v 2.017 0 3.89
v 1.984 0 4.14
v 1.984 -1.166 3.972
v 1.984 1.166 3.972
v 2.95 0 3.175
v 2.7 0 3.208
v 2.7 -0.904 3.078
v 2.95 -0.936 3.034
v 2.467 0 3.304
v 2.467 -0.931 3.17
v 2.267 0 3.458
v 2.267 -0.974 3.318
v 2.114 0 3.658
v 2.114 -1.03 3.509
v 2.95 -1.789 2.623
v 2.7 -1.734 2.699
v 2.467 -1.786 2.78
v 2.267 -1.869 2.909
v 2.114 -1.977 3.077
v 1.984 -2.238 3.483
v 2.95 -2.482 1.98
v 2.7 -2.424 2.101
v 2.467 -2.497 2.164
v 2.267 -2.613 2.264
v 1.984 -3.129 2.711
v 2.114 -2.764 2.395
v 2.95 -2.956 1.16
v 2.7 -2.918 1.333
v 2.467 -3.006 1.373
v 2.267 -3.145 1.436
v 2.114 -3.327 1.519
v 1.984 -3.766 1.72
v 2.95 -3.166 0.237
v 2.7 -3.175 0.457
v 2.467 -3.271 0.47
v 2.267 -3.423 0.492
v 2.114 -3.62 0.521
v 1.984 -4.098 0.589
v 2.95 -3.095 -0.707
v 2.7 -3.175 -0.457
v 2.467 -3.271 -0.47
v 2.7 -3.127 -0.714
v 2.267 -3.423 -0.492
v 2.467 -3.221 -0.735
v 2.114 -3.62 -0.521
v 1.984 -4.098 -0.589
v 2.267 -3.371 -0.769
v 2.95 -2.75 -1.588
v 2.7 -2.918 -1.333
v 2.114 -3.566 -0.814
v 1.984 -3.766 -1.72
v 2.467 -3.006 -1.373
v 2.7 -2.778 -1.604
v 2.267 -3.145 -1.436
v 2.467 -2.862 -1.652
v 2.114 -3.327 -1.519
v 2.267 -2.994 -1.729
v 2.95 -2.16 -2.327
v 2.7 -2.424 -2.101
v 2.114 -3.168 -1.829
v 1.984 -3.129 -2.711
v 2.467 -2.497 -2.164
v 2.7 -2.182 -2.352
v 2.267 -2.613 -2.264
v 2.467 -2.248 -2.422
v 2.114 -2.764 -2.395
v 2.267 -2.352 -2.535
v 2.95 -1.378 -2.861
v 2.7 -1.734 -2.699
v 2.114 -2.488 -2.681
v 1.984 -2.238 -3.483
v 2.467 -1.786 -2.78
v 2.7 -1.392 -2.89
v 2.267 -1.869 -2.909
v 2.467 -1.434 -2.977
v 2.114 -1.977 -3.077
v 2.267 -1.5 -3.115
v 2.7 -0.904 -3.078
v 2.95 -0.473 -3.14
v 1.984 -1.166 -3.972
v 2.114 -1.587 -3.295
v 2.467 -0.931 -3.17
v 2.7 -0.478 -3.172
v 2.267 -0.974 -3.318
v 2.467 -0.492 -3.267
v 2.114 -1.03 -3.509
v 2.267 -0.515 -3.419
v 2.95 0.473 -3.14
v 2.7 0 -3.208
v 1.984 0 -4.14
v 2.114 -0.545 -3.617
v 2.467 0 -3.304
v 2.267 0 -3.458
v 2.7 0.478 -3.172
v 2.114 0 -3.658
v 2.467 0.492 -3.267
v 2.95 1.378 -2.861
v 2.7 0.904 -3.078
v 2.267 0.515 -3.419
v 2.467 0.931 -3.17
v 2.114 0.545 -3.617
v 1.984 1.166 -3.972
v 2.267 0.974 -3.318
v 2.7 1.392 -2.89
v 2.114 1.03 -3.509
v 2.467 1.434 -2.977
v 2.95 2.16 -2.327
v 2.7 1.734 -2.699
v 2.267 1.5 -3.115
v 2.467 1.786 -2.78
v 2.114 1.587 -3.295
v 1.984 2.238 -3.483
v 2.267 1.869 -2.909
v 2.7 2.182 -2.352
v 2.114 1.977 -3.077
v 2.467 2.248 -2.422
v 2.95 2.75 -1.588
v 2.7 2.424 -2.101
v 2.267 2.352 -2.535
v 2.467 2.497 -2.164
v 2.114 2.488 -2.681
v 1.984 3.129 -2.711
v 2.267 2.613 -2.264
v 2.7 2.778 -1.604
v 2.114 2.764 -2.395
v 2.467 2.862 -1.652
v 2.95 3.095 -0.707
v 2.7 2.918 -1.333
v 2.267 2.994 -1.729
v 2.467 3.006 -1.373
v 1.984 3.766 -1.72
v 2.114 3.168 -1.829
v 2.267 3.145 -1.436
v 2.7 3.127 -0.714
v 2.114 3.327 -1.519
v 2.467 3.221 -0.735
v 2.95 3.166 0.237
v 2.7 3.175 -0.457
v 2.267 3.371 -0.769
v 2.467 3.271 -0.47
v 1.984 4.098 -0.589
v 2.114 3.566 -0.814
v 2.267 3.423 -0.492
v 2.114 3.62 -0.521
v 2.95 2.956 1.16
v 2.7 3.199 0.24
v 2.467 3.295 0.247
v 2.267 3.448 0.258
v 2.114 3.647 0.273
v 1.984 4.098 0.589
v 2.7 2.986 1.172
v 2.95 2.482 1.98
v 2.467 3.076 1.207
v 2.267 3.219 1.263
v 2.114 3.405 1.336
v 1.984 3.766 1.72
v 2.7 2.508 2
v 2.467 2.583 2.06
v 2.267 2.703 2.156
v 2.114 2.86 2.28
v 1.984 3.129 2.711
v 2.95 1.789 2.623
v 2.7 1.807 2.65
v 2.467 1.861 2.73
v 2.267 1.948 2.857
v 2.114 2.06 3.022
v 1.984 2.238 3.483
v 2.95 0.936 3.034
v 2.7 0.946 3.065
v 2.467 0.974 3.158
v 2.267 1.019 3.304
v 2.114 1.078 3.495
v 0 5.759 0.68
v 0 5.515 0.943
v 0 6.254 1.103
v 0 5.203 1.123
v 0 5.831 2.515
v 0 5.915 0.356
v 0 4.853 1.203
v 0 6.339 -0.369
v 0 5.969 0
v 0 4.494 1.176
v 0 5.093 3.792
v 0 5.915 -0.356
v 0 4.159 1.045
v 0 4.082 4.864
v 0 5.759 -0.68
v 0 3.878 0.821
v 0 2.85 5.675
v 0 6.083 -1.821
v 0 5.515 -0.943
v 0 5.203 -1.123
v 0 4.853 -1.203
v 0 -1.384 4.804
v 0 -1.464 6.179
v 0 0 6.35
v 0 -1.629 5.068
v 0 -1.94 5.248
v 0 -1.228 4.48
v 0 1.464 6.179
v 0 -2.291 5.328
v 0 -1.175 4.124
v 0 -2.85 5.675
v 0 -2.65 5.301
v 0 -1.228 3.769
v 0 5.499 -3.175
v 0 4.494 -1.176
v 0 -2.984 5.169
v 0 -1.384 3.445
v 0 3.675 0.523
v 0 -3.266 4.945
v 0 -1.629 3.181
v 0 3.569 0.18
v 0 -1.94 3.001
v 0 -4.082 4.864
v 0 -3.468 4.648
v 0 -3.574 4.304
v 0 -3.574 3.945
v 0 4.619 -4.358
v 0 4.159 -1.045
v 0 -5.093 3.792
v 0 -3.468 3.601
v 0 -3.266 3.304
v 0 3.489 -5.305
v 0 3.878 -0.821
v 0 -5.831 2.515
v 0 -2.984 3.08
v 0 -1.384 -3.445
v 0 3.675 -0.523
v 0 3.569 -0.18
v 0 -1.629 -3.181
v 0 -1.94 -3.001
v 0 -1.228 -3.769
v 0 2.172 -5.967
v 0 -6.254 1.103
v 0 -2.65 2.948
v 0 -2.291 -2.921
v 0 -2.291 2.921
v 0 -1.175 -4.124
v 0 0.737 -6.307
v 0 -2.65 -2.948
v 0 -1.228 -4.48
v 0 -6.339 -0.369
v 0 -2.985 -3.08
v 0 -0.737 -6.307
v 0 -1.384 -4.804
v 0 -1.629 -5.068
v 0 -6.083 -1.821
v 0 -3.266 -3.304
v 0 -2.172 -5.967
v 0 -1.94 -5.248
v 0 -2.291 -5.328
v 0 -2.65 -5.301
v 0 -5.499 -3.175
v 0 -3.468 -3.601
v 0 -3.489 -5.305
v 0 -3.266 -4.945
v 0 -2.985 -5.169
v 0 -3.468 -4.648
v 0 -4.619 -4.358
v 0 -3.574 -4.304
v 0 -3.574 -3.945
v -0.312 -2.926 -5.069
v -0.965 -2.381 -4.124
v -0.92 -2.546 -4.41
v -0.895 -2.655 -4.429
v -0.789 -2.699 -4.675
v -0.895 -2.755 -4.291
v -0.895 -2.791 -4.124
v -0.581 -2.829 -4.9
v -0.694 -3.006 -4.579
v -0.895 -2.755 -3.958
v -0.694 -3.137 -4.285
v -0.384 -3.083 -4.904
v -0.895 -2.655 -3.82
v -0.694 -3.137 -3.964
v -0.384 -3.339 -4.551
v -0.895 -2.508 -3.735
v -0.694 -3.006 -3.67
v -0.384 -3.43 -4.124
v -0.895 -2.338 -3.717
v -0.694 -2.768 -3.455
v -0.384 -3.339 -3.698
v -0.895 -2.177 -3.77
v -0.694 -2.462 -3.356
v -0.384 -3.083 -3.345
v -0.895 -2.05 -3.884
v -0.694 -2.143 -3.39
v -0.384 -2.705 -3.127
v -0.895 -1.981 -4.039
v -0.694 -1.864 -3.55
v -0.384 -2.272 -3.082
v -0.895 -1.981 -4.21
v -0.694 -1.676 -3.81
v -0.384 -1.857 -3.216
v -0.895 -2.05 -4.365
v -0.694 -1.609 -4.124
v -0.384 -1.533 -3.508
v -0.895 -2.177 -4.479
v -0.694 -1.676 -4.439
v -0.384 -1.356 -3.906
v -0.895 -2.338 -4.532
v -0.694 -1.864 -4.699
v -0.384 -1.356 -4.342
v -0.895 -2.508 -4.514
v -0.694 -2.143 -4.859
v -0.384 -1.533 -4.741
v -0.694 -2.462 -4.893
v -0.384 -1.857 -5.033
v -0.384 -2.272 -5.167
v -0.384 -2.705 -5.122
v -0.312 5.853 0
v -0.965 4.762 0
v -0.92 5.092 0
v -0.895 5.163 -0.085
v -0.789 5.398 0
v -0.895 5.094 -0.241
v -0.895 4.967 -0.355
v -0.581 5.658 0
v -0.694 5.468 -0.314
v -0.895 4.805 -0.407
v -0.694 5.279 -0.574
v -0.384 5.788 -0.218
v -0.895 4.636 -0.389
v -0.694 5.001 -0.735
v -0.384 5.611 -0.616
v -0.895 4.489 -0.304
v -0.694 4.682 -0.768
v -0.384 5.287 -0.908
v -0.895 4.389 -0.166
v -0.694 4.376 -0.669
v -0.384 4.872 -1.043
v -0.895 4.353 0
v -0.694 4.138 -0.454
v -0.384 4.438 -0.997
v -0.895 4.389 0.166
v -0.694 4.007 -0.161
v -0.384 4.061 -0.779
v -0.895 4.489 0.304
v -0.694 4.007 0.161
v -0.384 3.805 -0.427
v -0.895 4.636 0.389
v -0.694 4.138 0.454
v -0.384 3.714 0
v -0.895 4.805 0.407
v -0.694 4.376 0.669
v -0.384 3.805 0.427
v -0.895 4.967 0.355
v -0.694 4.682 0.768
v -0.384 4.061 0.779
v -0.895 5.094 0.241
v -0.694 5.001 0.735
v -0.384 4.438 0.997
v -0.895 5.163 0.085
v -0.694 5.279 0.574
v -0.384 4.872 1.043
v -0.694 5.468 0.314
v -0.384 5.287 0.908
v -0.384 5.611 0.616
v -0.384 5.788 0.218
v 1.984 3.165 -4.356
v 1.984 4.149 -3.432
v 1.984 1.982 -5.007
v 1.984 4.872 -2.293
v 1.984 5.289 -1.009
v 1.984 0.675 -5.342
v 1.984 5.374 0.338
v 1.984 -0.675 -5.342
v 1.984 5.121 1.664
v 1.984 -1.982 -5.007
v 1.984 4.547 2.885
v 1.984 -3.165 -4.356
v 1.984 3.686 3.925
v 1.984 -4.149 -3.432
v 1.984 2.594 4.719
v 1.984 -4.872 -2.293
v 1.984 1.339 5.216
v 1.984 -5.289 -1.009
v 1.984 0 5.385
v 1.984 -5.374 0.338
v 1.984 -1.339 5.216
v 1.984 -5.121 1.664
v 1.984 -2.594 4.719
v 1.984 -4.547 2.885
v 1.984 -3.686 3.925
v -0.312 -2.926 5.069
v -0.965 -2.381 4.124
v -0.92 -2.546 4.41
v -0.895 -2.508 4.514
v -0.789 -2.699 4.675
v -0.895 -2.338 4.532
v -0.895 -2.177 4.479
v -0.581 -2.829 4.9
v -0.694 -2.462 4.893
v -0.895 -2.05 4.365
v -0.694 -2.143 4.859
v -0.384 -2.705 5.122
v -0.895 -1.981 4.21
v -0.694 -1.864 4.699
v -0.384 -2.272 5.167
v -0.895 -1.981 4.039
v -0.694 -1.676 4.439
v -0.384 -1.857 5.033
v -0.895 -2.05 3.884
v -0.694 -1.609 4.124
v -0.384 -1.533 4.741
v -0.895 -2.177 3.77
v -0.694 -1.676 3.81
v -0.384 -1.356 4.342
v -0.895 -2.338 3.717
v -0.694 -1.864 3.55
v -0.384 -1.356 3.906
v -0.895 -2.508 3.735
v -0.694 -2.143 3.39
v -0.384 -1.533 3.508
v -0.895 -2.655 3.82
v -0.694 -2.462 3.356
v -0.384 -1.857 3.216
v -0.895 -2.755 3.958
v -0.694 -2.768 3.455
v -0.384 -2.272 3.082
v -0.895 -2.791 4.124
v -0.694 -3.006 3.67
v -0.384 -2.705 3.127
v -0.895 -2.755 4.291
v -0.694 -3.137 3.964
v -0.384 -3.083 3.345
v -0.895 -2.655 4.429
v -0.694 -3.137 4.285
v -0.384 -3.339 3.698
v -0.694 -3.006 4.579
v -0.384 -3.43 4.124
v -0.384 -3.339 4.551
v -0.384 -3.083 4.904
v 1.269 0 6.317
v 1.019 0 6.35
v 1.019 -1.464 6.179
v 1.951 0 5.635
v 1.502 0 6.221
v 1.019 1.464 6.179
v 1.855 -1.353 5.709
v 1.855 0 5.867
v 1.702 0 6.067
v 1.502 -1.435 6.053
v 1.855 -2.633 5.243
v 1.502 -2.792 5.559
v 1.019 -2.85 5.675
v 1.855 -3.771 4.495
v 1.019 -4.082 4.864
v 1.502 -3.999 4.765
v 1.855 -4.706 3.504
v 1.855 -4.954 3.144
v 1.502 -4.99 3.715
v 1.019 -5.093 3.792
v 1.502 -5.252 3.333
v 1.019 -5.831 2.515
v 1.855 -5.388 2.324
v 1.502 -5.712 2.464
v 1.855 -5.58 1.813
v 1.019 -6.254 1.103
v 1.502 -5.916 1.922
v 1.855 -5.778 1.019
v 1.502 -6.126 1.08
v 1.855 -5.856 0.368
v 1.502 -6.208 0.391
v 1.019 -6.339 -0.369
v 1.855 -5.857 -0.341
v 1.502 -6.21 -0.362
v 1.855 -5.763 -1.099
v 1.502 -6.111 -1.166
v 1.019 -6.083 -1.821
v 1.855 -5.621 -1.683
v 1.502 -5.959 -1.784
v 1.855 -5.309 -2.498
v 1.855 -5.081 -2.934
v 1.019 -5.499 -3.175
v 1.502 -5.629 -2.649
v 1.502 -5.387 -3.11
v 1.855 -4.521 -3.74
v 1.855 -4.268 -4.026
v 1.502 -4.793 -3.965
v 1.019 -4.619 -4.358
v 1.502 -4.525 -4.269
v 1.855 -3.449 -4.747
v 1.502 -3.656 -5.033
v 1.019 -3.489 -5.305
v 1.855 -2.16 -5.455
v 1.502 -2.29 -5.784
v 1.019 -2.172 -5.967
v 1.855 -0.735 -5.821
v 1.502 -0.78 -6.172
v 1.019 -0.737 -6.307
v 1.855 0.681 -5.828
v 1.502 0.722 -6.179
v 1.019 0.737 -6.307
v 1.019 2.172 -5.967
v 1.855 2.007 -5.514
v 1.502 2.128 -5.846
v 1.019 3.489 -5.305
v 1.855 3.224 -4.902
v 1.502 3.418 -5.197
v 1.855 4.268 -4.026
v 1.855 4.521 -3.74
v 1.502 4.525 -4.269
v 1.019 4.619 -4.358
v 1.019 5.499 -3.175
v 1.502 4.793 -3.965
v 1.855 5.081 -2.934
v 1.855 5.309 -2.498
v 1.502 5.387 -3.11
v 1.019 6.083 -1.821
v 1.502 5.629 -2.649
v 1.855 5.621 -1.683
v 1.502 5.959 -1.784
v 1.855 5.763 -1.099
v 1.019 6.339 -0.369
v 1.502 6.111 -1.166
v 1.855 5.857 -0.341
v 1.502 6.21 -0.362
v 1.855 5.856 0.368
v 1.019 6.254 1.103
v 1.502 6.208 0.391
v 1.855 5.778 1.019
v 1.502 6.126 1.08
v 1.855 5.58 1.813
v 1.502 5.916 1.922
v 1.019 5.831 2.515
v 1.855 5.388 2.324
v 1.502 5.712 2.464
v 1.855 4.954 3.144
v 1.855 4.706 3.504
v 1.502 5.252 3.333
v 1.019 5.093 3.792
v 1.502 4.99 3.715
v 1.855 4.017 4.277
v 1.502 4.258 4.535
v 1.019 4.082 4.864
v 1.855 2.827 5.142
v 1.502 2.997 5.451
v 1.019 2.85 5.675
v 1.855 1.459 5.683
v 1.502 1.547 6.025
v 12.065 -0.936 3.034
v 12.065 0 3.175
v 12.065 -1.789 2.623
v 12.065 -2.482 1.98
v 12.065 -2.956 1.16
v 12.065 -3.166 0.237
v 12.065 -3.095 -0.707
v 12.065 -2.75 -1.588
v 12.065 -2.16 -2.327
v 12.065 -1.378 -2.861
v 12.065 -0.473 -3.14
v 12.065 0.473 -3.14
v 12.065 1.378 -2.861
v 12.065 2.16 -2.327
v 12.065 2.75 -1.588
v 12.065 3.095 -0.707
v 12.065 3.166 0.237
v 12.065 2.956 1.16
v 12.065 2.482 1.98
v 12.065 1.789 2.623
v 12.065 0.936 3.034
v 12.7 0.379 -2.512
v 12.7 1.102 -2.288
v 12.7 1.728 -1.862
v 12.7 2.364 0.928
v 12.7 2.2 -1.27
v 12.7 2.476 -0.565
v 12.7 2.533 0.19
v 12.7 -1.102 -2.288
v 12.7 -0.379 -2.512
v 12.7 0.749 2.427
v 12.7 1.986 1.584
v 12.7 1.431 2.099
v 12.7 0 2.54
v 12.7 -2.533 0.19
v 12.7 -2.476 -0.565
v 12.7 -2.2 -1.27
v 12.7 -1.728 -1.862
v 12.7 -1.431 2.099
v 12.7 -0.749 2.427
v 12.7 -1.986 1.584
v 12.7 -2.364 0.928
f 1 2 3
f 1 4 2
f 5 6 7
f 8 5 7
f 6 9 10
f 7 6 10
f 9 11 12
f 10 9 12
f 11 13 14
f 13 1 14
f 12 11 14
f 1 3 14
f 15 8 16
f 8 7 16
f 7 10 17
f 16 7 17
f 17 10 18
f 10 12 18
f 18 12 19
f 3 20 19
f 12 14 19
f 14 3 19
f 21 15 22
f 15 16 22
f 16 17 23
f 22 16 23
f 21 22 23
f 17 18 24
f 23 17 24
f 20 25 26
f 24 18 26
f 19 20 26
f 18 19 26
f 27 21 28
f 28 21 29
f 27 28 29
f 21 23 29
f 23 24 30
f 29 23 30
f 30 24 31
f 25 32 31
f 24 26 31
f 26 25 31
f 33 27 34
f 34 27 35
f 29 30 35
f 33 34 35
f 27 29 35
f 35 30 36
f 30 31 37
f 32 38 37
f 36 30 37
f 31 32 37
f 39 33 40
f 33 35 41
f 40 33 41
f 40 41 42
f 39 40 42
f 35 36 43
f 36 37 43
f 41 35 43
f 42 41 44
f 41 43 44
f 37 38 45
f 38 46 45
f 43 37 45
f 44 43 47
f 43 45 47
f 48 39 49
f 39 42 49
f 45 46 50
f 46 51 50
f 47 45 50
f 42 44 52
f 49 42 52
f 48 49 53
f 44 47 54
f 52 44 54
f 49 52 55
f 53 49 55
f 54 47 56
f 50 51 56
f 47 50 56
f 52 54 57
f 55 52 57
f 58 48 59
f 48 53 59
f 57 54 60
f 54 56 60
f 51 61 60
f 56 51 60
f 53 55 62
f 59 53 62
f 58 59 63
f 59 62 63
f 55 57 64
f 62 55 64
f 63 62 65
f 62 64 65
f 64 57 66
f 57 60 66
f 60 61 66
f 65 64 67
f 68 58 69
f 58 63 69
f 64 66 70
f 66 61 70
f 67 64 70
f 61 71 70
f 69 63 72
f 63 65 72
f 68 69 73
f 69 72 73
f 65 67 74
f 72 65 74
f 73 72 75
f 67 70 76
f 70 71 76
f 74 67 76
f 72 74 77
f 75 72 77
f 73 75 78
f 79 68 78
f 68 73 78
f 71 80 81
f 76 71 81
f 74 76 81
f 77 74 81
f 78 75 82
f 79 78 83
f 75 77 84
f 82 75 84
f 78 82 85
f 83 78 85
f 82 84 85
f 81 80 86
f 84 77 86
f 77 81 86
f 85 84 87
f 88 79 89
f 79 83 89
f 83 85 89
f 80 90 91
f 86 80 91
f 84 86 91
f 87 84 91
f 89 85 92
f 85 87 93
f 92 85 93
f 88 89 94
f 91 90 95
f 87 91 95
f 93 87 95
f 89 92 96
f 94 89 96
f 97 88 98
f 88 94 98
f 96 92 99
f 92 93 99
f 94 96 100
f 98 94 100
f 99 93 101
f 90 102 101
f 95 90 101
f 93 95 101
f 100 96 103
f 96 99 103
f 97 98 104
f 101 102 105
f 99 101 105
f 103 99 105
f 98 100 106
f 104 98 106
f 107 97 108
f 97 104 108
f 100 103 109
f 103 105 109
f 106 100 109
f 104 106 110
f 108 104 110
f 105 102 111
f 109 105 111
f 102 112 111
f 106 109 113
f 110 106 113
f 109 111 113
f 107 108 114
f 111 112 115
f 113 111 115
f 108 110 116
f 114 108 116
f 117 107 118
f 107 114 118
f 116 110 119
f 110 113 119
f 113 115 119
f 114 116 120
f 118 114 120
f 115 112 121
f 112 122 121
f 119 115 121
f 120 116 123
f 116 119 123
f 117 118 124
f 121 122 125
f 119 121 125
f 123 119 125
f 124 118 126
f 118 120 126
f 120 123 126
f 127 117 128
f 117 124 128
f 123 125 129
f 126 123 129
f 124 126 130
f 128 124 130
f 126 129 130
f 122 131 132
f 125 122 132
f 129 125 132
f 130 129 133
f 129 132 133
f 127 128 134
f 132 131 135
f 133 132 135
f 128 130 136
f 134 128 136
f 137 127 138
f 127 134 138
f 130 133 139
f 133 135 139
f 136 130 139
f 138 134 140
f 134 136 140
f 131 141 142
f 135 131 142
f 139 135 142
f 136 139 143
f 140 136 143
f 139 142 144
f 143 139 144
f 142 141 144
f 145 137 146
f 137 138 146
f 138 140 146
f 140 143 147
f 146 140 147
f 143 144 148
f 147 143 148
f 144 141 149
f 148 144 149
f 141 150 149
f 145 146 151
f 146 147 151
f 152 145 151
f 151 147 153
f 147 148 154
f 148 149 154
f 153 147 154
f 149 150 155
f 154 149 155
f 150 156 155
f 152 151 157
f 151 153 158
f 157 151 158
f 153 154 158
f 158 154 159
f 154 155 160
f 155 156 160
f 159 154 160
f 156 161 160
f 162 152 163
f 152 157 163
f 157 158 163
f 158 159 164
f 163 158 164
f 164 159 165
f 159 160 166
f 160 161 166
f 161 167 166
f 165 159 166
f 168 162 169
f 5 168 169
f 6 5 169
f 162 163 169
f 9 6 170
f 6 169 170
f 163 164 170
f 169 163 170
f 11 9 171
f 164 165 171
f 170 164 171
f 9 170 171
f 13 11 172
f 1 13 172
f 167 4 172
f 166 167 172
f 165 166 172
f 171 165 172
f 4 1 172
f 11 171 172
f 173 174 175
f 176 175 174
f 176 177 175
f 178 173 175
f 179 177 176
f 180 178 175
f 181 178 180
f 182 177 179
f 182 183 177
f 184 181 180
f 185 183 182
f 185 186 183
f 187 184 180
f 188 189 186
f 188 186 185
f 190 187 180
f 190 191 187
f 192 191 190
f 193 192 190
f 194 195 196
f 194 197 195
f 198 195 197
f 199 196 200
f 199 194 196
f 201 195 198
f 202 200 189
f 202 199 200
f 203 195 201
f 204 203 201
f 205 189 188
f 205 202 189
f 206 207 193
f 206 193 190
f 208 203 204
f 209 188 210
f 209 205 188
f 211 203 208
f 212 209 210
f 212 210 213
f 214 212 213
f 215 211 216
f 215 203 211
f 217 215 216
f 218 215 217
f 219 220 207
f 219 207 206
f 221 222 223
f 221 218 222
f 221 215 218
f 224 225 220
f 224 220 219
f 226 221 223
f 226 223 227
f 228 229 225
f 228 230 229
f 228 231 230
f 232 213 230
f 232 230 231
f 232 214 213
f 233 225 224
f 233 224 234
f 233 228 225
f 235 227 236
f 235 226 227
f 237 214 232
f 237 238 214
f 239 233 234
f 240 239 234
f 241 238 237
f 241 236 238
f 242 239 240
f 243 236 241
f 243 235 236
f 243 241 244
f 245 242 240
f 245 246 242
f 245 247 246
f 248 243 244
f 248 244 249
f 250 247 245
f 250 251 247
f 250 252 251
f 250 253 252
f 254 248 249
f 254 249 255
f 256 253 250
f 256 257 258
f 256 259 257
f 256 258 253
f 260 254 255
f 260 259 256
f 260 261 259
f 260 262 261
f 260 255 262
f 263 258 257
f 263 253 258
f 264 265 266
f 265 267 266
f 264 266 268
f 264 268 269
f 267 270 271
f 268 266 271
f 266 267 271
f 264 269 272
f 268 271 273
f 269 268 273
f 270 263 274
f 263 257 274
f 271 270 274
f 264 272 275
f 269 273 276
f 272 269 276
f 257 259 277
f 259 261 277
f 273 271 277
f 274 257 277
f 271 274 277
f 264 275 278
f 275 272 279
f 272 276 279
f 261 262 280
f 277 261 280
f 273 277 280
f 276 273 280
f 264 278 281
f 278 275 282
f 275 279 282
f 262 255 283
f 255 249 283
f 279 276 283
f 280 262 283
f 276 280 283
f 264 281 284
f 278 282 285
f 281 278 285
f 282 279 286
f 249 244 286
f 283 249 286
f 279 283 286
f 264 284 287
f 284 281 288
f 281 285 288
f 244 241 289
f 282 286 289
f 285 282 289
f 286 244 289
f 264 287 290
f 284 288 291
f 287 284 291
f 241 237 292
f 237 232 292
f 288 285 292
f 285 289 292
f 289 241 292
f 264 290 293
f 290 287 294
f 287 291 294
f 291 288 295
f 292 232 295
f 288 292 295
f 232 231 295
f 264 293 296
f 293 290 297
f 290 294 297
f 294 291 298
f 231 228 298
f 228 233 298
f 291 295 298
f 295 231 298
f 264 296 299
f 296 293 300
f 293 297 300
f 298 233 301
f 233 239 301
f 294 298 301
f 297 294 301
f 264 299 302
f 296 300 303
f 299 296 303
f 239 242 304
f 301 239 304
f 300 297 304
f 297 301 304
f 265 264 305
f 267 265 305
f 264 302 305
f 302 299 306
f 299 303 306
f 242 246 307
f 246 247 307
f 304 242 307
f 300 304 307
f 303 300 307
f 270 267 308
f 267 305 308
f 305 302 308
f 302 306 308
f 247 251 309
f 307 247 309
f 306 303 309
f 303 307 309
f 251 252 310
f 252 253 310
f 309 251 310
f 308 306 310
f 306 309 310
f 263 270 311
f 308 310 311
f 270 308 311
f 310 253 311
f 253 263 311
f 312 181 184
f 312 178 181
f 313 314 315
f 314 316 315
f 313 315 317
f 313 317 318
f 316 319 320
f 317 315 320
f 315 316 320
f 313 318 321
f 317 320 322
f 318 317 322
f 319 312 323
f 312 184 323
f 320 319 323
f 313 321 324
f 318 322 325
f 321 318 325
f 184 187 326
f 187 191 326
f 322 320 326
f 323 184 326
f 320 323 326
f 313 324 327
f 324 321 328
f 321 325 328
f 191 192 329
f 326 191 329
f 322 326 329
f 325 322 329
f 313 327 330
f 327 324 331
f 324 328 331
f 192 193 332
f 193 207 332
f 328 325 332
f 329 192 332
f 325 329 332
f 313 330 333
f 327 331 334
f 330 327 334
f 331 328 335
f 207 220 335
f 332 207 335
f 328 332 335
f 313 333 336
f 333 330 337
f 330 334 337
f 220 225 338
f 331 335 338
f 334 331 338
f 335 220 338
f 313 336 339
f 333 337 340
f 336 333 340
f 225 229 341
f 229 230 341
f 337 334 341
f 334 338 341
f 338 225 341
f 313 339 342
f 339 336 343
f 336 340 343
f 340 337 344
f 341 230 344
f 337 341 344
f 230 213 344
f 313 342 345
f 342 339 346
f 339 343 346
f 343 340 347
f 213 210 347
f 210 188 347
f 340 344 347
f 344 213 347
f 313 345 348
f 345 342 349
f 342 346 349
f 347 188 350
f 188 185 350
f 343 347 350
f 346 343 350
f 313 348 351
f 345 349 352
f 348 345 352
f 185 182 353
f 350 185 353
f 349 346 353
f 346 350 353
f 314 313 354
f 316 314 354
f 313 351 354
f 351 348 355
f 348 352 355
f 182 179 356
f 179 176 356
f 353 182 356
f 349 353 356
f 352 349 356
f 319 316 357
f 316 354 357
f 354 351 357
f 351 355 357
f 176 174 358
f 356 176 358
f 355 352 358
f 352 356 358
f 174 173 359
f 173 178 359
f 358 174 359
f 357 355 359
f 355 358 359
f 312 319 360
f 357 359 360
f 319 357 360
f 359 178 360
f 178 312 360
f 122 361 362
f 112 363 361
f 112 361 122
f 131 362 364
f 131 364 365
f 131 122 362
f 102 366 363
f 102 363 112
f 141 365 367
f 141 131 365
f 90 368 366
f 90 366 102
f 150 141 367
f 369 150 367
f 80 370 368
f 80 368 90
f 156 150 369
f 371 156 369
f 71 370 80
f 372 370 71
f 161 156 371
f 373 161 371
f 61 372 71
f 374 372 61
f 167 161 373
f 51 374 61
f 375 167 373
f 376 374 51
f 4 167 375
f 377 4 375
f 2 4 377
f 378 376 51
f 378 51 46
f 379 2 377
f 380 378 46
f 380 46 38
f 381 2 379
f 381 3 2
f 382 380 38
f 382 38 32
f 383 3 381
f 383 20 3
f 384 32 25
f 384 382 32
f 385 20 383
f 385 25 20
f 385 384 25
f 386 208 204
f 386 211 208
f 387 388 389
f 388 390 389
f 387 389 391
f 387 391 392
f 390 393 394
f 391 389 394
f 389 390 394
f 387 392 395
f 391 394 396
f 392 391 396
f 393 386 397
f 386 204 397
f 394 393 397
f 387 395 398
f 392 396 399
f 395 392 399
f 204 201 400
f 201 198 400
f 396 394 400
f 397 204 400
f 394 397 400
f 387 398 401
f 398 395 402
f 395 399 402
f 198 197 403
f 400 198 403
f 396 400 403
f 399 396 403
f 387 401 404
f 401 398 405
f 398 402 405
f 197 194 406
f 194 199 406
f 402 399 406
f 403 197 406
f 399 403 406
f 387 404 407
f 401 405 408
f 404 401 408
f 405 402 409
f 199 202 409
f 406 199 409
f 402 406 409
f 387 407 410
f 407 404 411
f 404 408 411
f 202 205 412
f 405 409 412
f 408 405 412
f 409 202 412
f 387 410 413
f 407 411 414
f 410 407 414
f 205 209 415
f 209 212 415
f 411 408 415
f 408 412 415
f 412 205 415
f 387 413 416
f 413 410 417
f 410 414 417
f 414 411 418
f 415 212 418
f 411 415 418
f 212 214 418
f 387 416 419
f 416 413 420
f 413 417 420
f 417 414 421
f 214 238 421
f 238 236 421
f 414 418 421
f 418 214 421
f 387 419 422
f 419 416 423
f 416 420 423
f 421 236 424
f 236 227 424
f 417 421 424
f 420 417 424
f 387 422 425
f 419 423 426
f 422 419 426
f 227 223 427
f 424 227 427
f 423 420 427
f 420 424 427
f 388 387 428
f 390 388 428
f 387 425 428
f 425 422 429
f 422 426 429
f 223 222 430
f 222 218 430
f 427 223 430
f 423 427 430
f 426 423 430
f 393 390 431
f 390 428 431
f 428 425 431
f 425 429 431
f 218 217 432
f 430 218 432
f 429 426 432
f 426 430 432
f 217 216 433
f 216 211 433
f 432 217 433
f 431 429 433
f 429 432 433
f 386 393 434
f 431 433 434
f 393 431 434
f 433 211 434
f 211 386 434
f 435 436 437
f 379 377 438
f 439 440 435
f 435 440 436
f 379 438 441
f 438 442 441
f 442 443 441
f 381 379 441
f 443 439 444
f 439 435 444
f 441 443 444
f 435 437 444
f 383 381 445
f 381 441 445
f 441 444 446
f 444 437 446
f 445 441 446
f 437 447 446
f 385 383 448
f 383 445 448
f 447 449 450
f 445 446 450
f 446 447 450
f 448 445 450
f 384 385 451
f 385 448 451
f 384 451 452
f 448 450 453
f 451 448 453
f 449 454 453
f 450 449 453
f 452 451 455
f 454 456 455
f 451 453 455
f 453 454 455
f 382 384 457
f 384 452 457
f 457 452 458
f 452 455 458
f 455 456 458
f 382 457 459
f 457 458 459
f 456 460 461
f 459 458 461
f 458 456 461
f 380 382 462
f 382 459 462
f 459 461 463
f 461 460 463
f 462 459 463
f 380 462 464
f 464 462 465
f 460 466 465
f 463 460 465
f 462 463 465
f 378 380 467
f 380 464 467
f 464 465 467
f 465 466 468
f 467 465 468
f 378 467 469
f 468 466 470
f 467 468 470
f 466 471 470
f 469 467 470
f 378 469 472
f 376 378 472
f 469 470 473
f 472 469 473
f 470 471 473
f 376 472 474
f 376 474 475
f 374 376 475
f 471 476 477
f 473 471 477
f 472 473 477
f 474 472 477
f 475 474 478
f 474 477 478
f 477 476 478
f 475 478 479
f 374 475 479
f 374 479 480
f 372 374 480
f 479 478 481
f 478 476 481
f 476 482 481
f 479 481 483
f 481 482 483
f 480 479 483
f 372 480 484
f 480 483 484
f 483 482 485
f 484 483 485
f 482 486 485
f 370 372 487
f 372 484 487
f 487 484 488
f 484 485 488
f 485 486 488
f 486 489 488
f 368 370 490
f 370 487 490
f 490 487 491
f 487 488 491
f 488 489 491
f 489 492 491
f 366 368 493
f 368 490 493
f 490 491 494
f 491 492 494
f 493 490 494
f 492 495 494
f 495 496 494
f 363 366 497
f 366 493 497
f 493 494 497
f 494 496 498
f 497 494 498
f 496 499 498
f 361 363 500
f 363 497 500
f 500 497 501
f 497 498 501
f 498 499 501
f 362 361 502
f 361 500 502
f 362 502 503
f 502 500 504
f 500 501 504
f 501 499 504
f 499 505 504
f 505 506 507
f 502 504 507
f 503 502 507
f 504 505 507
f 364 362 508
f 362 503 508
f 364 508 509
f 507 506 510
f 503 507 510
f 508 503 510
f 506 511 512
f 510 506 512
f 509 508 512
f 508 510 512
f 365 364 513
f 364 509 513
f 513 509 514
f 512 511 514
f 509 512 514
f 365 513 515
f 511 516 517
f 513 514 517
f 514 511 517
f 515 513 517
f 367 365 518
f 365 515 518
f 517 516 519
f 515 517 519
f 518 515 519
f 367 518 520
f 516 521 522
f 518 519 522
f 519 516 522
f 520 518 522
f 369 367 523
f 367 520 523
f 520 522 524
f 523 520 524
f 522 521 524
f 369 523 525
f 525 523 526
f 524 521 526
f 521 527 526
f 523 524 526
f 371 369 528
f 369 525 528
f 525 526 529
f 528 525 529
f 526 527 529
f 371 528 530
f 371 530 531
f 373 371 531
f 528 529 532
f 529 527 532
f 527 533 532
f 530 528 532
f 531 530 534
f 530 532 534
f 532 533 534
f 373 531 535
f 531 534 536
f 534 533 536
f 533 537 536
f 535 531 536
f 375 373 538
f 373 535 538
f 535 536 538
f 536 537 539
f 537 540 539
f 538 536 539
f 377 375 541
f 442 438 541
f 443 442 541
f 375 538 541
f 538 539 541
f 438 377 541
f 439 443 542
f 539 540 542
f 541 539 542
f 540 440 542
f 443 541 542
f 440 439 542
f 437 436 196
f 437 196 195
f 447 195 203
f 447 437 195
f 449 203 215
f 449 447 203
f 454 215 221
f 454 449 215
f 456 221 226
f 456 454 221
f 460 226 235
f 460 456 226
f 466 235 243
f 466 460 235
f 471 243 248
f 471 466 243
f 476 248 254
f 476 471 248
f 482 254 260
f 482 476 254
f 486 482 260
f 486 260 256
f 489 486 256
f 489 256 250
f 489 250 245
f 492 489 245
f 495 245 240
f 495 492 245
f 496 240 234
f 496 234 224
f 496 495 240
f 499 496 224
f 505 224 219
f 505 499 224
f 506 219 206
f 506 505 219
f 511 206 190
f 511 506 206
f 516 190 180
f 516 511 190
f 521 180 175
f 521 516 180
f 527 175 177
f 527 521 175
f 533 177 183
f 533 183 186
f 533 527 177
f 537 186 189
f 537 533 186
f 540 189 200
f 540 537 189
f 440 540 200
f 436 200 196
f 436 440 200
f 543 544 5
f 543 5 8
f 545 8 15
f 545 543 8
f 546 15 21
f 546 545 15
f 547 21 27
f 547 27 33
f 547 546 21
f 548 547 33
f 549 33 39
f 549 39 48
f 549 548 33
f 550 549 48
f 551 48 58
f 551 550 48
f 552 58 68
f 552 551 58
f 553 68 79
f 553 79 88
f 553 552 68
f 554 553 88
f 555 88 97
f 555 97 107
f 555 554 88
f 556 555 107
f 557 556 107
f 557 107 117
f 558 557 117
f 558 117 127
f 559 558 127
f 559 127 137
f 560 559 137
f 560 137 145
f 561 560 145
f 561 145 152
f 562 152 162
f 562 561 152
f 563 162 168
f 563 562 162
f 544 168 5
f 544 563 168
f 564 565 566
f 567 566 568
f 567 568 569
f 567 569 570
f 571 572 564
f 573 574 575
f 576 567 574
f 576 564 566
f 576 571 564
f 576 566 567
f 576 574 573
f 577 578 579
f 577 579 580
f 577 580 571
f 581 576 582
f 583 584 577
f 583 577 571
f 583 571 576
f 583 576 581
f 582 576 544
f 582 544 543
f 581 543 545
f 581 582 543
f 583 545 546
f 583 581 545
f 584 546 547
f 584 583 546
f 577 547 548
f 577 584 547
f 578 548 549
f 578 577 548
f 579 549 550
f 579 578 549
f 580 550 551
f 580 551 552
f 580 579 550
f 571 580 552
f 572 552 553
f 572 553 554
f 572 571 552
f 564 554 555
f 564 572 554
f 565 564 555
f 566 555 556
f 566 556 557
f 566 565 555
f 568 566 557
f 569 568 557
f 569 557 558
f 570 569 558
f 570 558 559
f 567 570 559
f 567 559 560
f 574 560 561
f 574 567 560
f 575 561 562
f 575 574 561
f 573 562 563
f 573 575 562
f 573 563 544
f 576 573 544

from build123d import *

# Parameters (mm, degrees)
CHAMFER1_SIZE     = 0.635
CIRPATTERN2_COUNT = 3
FILLET2_R         = 0.9652


with BuildPart() as part:
    # Sketch1 → Revolve1 (revolve)
    with BuildSketch(Plane.XY, mode=Mode.PRIVATE) as revolve1_sk:
        Polygon((0, 0), (0, 6.35), (1.984375, 6.35), (1.984375, 3.175), (12.7, 3.175), (12.7, 0), align=None)
    revolve(revolve1_sk.sketch.rotate(Axis((0, 0, 0), (1, 0, 0)), 90), axis=Axis((0, 0, 0), (1, 0, 0)))

    # Chamfer1
    chamfer1_edges = [part.edges().sort_by_distance(p)[0] for p in [
        (12.7, 0, -3.175),
    ]]
    chamfer(chamfer1_edges, length=CHAMFER1_SIZE)

    # Sketch3 → Revolve3 (revolve)
    with BuildSketch(Plane.XY):
        with BuildLine():
            Line((0, 4.7625), (-0.9652, 4.7625))
            ThreePointArc((-0.9652, 4.7625), (-0.694208674, 5.535036939), (0, 5.969))
            Line((0, 5.969), (0, 4.7625))
        make_face()
    revolve3 = revolve(axis=Axis((1.984375, 4.7625, 0), (-1, 0, 0)))

    # CirPattern2: Revolve3 ×3 about axis
    cirpattern2_axis = Axis((0, 0, 0), (1, 0, 0))
    for i in range(1, CIRPATTERN2_COUNT):
        add(revolve3.rotate(cirpattern2_axis, i * 360 / CIRPATTERN2_COUNT))

    # Fillet2
    fillet2_edges = [part.edges().sort_by_distance(p)[0] for p in [
        (1.984375, 0, -3.175),
        (1.984375, 0, -6.35),
    ]]
    fillet(fillet2_edges, radius=FILLET2_R)


solid = part.part
